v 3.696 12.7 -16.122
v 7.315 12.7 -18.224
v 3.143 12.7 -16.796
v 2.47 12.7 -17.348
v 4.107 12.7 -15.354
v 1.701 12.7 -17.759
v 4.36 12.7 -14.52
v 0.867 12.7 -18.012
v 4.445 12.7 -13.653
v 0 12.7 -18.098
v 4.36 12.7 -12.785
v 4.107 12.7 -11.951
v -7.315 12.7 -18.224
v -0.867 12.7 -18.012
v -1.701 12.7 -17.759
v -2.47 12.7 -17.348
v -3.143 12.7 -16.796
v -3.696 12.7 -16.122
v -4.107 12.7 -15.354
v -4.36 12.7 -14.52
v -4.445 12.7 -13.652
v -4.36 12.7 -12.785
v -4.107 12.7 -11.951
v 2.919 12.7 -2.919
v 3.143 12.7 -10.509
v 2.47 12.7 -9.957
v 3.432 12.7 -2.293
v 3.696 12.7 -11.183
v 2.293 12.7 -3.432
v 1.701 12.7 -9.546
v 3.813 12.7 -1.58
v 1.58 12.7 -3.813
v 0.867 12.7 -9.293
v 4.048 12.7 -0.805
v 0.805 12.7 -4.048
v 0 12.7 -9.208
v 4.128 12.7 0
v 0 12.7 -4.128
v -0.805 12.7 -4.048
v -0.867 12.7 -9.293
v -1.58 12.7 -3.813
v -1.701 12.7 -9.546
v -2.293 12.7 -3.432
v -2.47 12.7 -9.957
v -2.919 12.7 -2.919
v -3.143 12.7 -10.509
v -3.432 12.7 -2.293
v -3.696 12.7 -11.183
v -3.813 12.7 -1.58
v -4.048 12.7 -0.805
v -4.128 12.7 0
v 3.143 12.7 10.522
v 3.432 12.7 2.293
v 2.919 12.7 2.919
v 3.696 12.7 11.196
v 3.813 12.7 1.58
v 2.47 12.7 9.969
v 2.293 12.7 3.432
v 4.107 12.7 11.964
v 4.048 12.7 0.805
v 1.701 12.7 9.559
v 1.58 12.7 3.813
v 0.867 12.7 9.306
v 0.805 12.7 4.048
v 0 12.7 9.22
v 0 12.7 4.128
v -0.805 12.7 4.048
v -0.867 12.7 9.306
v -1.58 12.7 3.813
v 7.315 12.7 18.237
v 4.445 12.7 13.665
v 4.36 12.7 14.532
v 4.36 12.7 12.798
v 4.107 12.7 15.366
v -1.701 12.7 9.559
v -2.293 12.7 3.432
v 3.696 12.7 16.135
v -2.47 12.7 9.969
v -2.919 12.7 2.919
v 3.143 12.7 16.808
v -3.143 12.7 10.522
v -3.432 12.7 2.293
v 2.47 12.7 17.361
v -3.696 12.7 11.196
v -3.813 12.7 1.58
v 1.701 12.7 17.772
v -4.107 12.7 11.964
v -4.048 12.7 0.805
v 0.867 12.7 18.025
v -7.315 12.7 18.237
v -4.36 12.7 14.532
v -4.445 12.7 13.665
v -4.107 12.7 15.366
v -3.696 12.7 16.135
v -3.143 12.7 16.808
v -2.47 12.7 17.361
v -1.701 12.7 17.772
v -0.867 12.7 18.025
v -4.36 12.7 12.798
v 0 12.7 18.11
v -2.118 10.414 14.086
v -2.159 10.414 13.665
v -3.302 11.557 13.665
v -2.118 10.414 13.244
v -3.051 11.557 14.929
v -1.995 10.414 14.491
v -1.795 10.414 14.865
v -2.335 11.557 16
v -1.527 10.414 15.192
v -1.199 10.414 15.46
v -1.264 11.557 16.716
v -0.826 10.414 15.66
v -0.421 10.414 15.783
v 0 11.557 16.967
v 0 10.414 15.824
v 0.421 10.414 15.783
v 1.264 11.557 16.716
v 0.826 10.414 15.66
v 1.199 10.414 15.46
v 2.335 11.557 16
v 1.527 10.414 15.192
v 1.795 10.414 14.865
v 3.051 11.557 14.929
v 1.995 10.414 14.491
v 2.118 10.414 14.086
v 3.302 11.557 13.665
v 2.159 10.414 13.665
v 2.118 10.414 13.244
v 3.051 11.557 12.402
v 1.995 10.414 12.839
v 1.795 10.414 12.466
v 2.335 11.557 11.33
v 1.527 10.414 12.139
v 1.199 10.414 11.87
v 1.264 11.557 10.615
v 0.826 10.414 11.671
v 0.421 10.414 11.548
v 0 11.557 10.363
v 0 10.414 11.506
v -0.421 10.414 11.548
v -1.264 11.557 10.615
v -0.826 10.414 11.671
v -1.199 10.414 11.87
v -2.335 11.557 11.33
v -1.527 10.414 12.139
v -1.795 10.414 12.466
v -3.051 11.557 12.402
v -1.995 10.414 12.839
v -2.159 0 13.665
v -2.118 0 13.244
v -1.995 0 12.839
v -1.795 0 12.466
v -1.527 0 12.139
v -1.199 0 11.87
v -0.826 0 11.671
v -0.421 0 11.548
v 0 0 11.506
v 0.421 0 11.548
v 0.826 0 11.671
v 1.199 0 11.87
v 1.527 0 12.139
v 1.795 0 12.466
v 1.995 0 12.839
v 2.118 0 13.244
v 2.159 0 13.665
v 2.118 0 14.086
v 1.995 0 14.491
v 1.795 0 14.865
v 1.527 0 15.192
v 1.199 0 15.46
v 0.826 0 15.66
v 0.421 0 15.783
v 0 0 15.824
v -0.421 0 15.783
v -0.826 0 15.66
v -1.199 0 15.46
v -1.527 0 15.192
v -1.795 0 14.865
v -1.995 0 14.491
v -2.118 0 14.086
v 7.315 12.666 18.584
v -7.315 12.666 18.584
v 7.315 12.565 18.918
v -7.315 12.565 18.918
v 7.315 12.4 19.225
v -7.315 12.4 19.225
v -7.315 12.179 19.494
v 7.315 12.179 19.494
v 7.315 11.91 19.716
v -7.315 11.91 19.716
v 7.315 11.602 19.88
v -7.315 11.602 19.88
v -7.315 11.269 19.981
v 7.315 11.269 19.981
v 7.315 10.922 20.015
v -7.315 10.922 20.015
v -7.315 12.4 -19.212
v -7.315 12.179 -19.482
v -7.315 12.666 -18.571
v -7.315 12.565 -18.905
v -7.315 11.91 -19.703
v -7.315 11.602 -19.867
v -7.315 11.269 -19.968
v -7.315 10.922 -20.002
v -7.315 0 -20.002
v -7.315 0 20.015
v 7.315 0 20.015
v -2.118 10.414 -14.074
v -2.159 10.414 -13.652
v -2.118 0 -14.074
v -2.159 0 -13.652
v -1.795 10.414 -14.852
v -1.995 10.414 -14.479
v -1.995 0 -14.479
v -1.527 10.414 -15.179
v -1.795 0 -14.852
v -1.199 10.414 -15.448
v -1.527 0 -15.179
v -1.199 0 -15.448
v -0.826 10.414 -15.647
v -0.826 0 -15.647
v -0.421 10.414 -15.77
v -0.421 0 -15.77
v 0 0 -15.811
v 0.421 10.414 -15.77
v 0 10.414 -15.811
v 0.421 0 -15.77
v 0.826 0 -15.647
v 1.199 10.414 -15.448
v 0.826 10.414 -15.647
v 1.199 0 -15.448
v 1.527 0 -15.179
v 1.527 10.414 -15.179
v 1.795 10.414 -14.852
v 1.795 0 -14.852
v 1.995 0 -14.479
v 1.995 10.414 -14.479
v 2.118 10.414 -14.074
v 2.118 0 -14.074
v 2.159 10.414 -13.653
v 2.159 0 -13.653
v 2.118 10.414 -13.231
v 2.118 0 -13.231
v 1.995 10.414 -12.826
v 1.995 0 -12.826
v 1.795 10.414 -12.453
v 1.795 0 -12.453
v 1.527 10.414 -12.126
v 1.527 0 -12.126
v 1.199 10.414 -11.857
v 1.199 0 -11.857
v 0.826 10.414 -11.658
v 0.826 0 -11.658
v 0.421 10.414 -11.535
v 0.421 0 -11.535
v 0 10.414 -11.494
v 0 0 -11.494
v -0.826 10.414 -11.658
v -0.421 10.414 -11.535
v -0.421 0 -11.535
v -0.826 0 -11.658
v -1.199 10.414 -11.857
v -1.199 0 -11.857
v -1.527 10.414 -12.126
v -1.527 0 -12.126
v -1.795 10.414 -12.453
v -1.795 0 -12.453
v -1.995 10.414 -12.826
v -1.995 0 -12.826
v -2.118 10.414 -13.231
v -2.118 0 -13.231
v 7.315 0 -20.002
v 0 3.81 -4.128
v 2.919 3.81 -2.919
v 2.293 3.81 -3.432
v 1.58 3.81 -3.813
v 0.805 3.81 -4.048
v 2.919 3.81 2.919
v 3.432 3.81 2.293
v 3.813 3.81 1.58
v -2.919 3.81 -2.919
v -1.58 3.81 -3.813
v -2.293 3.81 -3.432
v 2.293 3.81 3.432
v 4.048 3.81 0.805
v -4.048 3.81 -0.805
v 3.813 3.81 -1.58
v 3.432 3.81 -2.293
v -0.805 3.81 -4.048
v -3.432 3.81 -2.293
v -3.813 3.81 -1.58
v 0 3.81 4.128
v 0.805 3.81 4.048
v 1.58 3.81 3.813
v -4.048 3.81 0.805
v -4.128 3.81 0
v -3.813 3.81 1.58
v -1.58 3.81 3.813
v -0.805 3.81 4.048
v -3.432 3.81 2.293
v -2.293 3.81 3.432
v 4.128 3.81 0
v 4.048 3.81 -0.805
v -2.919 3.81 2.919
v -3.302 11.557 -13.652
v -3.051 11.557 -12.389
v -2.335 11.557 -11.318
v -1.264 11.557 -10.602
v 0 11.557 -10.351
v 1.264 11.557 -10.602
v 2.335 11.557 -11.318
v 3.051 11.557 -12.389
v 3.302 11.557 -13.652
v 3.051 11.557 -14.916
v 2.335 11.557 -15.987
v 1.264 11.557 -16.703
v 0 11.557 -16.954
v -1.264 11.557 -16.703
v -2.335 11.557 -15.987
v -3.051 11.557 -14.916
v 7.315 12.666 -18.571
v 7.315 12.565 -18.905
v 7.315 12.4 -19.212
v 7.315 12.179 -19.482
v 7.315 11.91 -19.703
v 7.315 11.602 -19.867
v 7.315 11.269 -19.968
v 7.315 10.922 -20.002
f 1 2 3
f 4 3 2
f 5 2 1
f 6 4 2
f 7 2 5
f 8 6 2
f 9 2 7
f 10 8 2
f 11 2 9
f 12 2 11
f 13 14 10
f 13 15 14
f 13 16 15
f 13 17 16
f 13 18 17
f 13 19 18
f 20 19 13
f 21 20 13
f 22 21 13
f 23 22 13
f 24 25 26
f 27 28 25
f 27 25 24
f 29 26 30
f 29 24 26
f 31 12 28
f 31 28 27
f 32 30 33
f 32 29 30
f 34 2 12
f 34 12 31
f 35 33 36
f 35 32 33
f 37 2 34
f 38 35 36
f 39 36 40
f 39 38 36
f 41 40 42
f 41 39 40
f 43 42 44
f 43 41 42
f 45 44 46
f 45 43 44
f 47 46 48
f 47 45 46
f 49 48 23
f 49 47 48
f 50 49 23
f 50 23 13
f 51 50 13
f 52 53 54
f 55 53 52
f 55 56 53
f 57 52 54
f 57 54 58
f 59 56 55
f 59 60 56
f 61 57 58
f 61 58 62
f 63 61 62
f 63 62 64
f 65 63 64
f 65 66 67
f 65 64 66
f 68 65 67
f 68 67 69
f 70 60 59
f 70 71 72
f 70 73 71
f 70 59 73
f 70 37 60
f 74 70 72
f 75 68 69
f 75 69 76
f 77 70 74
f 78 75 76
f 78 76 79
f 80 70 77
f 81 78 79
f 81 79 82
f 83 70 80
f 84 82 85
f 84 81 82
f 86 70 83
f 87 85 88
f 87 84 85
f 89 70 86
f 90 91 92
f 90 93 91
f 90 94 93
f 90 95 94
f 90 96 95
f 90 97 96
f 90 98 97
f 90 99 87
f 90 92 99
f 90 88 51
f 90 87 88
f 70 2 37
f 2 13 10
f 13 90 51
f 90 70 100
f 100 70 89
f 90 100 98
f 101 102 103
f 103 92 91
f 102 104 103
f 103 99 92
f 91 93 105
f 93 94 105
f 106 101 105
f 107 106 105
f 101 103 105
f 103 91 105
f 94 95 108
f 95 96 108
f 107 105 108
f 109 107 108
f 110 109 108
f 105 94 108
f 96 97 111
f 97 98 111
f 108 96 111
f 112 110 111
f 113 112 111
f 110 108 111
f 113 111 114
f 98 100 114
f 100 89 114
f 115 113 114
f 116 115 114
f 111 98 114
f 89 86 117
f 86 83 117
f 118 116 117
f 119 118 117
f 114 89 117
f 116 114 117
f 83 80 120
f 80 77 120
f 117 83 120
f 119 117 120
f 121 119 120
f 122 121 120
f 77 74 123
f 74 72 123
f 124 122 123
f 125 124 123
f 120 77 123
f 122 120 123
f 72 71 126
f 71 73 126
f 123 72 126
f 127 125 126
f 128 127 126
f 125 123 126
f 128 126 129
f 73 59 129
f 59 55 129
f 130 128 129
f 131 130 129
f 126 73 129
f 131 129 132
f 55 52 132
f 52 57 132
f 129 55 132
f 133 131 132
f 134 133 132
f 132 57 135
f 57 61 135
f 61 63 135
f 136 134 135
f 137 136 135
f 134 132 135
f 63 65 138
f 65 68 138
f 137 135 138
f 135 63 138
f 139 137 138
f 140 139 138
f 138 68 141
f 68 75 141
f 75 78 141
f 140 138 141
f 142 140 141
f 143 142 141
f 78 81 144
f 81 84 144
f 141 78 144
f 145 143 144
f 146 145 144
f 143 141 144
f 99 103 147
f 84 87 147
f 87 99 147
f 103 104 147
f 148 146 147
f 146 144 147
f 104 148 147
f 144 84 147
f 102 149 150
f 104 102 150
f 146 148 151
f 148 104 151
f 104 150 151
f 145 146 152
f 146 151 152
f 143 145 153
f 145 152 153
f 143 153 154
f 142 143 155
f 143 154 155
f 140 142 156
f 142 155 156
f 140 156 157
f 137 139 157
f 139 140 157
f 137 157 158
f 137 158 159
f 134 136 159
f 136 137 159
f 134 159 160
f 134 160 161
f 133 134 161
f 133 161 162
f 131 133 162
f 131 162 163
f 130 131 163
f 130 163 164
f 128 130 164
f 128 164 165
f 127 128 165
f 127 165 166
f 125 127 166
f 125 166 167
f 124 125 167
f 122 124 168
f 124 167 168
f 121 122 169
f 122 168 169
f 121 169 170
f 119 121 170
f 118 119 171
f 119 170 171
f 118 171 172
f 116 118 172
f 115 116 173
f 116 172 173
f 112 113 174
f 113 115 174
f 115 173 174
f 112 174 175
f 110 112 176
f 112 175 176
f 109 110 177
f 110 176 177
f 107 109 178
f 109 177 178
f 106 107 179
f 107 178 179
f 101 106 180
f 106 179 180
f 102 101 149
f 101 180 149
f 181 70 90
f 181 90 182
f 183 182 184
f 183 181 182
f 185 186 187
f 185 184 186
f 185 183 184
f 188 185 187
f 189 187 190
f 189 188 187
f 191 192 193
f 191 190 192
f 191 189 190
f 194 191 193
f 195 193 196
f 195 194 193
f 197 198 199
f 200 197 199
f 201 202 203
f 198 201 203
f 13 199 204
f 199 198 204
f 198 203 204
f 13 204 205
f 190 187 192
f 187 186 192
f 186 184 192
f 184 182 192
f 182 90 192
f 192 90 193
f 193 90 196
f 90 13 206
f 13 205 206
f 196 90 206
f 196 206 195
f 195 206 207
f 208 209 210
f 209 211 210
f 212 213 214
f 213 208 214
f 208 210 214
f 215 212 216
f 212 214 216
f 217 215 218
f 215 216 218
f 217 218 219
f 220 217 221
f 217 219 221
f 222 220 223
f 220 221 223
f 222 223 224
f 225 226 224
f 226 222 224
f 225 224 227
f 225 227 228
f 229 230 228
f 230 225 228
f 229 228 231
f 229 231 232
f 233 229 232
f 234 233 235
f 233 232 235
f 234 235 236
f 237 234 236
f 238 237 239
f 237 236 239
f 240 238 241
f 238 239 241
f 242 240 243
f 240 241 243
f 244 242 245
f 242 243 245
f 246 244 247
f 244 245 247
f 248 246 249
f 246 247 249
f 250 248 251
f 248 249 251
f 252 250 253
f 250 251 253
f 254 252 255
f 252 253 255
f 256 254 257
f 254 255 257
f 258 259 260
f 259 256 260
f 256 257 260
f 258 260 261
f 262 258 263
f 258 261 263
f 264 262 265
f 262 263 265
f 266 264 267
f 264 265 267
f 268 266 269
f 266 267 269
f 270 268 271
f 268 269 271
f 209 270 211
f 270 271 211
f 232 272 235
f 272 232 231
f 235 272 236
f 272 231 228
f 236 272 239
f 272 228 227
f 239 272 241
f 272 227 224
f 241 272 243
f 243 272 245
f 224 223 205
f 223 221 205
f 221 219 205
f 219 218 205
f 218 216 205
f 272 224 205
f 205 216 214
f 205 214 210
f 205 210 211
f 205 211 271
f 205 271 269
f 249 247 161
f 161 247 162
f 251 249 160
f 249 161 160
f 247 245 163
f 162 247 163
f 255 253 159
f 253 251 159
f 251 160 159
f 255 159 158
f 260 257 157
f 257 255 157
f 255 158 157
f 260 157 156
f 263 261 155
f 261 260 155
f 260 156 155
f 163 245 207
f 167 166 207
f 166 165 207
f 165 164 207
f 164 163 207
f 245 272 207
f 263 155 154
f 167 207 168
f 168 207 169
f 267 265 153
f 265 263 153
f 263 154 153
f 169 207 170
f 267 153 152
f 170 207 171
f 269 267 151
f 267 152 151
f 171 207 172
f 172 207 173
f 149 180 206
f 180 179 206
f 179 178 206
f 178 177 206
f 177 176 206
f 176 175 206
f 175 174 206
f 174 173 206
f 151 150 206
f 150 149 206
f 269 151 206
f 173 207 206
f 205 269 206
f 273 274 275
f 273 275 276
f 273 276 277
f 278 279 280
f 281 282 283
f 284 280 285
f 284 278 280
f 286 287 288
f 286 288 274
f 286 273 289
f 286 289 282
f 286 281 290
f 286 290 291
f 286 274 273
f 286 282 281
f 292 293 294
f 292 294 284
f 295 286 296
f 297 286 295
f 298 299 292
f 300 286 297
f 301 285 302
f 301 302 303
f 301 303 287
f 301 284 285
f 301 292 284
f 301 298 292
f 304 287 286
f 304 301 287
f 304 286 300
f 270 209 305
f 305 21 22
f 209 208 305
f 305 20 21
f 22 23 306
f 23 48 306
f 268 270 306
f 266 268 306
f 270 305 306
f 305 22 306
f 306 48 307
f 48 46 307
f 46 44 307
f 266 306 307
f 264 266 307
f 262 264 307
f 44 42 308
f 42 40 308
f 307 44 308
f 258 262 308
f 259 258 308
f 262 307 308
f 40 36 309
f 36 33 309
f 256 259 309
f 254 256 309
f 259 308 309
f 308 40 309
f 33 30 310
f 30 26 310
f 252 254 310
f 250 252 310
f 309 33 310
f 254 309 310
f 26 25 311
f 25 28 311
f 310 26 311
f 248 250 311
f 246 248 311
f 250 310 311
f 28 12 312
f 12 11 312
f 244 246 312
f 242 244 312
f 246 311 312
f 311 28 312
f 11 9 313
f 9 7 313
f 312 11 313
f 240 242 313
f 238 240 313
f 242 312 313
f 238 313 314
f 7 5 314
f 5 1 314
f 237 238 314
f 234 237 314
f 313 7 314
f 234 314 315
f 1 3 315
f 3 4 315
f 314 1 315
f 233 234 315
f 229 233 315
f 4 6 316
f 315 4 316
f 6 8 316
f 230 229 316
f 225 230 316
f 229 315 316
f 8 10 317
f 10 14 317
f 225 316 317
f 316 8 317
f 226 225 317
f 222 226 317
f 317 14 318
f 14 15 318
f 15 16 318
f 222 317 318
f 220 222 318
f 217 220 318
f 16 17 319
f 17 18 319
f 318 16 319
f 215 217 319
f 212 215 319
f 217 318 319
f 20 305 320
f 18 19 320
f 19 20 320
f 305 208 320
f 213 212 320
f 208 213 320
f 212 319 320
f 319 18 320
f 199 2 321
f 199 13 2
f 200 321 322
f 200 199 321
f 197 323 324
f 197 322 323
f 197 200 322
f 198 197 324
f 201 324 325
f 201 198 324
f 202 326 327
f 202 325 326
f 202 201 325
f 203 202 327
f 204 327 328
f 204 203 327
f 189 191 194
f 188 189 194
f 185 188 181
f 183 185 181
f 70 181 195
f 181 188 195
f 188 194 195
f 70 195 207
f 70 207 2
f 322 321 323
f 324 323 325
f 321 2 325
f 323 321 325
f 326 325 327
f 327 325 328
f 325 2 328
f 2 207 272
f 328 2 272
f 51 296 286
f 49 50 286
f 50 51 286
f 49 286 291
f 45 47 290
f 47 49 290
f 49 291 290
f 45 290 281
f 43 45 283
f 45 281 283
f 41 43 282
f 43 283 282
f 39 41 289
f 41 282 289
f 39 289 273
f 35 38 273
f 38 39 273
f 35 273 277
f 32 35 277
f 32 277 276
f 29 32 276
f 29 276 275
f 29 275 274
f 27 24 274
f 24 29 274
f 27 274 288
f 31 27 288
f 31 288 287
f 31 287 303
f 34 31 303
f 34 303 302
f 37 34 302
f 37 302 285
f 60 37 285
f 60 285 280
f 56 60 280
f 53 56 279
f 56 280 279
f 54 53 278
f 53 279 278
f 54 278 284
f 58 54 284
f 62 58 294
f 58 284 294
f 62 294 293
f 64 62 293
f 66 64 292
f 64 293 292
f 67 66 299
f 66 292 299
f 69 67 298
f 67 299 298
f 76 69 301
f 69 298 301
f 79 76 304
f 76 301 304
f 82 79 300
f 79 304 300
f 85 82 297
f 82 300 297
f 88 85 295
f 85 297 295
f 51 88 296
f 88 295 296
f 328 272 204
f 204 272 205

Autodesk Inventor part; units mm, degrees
ref_plane "YZ Plane" through (0, 0, 0) normal (1, 0, 0) x (0, 1, 0)
ref_plane "XZ Plane" through (0, 0, 0) normal (0, 1, 0) x (-1, 0, 0)
ref_plane "XY Plane" through (0, 0, 0) normal (0, 0, 1) x (1, 0, 0)
sketch "Sketch1" plane through (0, 0, 0) normal (0, 1, 0) x (-1, 0, 0)
  circle A0 centre (0, 0) radius 4.1275
  line L0 (7.3152, 7.3152) -> (-7.3152, 7.3152)
  line L1 (-7.3152, 7.3152) -> (-7.3152, -7.3025)
  line L2 (-7.3152, -7.3025) -> (7.3152, -7.3025)
  line L3 (7.3152, -7.3025) -> (7.3152, 7.3152)
  line L4 (7.3152, 20.0152) -> (-7.3152, 20.0152)
  line L5 (-7.3152, 20.0152) -> (-7.3152, -20.0025)
  line L6 (-7.3152, -20.0025) -> (7.3152, -20.0025)
  line L7 (7.3152, -20.0025) -> (7.3152, 20.0152)
  circle A1 centre (0, 13.6652) radius 2.159
  circle A2 centre (0, -13.6525) radius 2.159
  line L8 (7.3152, 7.3152) -> (20.0152, 7.3152)
  line L9 (20.0152, 7.3152) -> (20.0152, -7.3025)
  line L10 (20.0152, -7.3025) -> (7.3152, -7.3025)
  line L11 (7.3152, -7.3025) -> (7.3152, 7.3152)
  line L12 (-7.3152, 7.3152) -> (-20.0152, 7.3152)
  line L13 (-20.0152, 7.3152) -> (-20.0152, -7.3025)
  line L14 (-20.0152, -7.3025) -> (-7.3152, -7.3025)
  line L15 (-7.3152, -7.3025) -> (-7.3152, 7.3152)
  circle A3 centre (13.6652, 0.0063) radius 1.9812
  circle A4 centre (-13.6652, 0.0063) radius 1.9812
  point P0 (-7.3152, 7.3152)
  point P1 (-7.3152, -7.3025)
  point P2 (-7.3152, -7.3025)
  dimension "d0" = 8.255
  dimension "d1" = 7.3025
  dimension "d2" = 7.3152
  dimension "d3" = 7.3152
  dimension "d4" = 7.3152
  dimension "d5" = 4.318
  dimension "d6" = 4.318
  dimension "d7" = 12.7
  dimension "d8" = 12.7
  dimension "d9" = 6.35
  dimension "d10" = 6.35
  dimension "d23" = 12.7
  dimension "d24" = 12.7
  dimension "d25" = 3.9624
  dimension "d26" = 3.9624
extrude "Extrusion1" add sketch "Sketch1" along normal blind 12.7 contours L3 L2 L1 L0 | L0 L5 L4 L7 | L7 L6 L5 L2
extrude "Extrusion3" add sketch "Sketch1" along normal blind 3.81 contours A0
fillet "Fillet5" radius 1.778 2 edges at (0, 12.7, 20.0152) (0, 12.7, -20.0025)
chamfer "Chamfer2" distance 2.286 angle 45 2 edges at (2.159, 12.7, 13.6652) (2.159, 12.7, -13.6525)
properties part number "Rod Holder Top V1_3DPrint"
